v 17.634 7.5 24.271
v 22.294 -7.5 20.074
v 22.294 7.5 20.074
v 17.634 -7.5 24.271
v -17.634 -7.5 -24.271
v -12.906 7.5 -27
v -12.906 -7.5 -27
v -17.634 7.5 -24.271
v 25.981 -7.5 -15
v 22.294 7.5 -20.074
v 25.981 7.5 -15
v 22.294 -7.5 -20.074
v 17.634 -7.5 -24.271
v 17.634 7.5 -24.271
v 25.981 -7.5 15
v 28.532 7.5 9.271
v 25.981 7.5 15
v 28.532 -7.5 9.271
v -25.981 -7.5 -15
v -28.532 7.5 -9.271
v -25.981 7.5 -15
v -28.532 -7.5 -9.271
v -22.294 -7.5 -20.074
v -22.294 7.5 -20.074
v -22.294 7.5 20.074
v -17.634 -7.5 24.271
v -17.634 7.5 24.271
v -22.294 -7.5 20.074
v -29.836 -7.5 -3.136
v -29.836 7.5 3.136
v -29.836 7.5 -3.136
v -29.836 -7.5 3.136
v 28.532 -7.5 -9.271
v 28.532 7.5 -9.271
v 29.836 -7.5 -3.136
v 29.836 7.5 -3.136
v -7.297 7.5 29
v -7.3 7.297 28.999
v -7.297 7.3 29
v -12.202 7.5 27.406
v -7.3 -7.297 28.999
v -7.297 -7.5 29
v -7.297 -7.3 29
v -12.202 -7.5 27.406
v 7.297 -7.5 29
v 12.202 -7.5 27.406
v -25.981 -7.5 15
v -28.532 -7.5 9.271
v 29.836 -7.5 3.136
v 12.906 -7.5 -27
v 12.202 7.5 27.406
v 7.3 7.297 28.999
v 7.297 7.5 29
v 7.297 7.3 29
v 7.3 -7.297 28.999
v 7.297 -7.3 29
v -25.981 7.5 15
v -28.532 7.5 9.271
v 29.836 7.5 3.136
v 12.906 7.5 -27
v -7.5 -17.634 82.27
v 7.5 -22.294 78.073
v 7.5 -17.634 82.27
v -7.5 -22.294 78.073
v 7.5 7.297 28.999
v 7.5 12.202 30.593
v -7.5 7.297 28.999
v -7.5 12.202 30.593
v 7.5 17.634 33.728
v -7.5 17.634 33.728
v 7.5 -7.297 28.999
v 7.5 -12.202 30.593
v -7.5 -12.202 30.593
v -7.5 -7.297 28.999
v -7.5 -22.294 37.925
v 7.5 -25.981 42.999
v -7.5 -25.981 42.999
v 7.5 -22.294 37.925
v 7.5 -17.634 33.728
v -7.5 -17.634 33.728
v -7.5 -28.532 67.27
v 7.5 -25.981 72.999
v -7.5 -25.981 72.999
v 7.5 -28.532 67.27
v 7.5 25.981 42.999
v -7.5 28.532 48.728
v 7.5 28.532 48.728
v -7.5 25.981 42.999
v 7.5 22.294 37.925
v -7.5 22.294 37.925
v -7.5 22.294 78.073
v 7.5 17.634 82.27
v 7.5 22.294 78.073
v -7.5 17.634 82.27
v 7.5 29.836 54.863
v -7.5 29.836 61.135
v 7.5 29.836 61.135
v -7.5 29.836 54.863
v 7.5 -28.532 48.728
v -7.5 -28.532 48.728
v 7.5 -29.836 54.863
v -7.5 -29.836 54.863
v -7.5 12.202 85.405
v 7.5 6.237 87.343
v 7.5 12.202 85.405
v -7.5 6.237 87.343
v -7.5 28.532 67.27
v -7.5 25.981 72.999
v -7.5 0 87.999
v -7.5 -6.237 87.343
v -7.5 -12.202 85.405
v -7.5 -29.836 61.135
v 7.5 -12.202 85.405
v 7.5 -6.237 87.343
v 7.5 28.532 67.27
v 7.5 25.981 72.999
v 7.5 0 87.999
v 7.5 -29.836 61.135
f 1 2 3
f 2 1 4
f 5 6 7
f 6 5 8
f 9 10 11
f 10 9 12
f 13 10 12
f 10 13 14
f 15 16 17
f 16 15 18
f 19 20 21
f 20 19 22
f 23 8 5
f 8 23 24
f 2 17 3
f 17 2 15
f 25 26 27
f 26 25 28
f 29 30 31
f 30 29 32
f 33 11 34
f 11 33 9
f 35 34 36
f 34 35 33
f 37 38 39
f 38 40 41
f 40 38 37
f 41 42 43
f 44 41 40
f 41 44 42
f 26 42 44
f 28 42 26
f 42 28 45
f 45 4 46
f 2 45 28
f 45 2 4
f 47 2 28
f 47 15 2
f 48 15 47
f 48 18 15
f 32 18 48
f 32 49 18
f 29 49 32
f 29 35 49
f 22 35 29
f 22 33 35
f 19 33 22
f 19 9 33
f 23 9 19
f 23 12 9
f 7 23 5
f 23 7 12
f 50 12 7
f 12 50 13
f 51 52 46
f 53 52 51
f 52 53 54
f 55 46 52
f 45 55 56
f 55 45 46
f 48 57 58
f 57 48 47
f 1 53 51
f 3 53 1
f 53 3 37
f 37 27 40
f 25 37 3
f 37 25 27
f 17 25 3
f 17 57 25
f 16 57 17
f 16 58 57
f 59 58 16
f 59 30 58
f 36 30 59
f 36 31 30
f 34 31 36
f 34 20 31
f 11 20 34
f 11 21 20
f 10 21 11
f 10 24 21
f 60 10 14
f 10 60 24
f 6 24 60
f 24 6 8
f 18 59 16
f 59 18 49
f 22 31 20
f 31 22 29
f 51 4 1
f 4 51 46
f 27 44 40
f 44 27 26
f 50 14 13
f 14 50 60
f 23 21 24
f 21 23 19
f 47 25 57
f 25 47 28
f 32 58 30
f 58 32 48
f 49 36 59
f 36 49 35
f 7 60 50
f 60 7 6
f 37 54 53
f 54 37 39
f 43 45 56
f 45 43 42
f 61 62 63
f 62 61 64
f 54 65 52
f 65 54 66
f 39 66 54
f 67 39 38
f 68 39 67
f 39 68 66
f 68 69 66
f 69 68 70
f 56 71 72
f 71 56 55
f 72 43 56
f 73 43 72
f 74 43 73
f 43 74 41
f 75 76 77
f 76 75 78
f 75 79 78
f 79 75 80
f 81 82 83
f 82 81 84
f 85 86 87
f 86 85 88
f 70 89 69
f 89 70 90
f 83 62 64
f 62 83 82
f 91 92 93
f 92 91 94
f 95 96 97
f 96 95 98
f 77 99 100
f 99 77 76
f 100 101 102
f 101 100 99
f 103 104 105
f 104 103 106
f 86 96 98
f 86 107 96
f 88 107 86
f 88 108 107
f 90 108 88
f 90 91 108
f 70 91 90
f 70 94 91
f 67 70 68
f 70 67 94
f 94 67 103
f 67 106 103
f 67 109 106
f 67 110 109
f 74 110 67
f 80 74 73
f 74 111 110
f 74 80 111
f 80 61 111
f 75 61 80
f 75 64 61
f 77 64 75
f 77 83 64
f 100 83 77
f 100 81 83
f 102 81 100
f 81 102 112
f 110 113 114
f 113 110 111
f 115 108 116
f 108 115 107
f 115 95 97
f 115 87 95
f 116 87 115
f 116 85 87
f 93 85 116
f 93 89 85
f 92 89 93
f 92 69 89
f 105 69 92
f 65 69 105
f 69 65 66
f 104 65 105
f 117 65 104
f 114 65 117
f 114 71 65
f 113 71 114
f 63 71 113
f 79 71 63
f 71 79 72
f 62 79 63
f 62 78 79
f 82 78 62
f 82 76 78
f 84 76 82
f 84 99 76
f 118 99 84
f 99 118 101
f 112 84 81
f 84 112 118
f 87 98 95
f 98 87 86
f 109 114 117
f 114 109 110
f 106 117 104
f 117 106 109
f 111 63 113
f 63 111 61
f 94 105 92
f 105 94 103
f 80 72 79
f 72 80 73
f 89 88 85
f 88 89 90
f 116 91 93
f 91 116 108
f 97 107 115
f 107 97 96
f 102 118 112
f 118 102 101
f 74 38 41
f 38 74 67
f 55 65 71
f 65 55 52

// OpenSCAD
// #82 - infinite tower
// Author: RJ Duran (rjduranjr@gmail.com)
// Date: 2025.01.07

slice_dist = 32;
thickness = 15;

// bottom cylinder
rotate([0,90,90]){
    difference(){
        cylinder(h=thickness, r=30, center=true);
        
        translate([slice_dist,0,0])
            cube([10,60,thickness+1], center=true);
        
        translate([-slice_dist-2,0,0])
            cube([10,60,thickness+1], center=true);
    }
}

// top cylinder
translate([0,0,57.999]){
    rotate([0,90,0]){
        difference(){
            cylinder(h=thickness, r=30, center=true);
            
            translate([slice_dist+2,0,0])
                cube([10,60,thickness+1], center=true);
        }
    }
}
